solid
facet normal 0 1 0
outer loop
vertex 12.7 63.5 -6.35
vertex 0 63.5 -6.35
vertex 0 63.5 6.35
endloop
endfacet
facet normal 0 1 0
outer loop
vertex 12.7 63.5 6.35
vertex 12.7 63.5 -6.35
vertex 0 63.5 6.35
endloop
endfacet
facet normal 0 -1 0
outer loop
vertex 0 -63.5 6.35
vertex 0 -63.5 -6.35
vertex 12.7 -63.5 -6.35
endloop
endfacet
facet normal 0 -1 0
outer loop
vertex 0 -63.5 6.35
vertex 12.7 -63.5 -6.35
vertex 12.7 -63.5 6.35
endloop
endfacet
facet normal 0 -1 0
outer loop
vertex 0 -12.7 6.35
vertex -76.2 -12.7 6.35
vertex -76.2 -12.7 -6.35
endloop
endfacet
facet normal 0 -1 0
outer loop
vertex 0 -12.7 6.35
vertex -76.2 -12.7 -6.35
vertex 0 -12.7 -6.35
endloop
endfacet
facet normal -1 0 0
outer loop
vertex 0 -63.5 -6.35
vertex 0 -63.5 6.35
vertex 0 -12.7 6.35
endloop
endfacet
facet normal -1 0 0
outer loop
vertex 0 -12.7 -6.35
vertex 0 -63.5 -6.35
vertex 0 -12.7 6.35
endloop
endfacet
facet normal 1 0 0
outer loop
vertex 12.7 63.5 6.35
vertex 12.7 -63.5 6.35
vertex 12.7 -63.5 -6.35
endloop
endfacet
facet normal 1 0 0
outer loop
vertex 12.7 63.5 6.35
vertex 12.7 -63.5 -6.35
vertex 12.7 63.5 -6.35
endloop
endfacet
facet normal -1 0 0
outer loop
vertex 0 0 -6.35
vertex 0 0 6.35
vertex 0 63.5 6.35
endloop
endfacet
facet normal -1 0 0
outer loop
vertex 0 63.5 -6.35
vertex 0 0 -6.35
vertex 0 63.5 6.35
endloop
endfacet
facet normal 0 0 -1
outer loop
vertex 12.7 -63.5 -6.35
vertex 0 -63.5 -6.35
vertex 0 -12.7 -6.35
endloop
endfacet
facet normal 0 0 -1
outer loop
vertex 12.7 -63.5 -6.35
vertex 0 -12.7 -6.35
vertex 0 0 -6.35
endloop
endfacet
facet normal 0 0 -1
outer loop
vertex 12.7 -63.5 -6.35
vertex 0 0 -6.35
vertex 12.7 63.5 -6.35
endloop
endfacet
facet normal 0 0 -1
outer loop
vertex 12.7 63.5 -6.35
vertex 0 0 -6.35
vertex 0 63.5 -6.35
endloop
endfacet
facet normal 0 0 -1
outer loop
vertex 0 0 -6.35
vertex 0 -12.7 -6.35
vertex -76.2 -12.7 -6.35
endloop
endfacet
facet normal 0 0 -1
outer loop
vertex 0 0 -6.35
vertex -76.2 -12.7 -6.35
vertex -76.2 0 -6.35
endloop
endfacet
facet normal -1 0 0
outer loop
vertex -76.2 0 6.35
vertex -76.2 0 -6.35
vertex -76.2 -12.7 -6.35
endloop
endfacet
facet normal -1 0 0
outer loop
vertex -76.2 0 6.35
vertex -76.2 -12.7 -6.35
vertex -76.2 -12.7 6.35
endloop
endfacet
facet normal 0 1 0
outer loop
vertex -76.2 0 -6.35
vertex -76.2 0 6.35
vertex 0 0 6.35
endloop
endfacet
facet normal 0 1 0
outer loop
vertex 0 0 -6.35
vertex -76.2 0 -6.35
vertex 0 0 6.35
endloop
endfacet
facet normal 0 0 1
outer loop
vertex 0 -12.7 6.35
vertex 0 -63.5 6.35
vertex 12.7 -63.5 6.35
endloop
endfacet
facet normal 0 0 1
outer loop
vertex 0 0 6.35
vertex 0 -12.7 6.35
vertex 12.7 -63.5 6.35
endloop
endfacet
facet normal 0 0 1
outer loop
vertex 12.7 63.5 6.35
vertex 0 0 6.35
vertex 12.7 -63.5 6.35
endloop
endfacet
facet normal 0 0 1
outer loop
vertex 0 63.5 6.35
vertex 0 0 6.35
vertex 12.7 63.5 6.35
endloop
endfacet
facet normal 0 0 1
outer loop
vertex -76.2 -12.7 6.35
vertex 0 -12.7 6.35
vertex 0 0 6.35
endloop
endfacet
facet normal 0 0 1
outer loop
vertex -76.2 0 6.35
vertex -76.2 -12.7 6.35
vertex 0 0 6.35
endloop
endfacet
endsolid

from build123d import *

# Parameters (mm, degrees)
F0_W     = 127
F0_H     = 12.7
F1_DEPTH = 12.7
F2_W     = 76.2
F2_H     = 12.7
F3_DEPTH = 12.7


with BuildPart() as f1:
    # F0 (on Right) → F1 (new body)
    with BuildSketch(Plane.YZ):
        Rectangle(F0_W, F0_H)
    extrude(amount=F1_DEPTH)

    # F2 (on Front) → F3 (join)
    with BuildSketch(Plane.XZ):
        with Locations((-38.1, 0)):
            Rectangle(F2_W, F2_H)
    extrude(amount=F3_DEPTH)


solid = f1.part
